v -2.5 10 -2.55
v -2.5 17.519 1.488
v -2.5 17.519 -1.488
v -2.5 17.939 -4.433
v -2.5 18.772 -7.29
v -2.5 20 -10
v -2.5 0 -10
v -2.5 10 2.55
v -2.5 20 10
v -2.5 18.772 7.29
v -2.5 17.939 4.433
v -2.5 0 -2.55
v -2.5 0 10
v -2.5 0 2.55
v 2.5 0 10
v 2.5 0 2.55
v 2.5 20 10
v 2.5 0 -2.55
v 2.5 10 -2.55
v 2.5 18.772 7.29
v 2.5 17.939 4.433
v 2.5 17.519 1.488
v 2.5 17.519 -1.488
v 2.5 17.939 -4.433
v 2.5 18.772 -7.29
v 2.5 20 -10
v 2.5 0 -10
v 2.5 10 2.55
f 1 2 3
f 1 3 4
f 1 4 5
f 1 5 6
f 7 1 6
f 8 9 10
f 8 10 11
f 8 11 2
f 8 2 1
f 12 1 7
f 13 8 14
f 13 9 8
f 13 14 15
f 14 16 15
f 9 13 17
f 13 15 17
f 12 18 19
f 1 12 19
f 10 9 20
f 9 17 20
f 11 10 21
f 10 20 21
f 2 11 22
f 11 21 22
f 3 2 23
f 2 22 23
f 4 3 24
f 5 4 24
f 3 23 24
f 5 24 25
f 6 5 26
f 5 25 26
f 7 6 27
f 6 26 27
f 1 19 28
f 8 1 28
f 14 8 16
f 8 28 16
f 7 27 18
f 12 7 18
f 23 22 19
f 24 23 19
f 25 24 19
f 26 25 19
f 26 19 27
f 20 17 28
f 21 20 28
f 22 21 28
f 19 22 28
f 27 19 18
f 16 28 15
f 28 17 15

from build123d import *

# Parameters (mm, degrees)
PAD_DEPTH = 2.5


with BuildPart() as part:
    # Sketch → Pad (new body, symmetric)
    with BuildSketch(Plane.YZ):
        with BuildLine():
            Line((10, -2.55), (10, 2.55))
            Line((10, 2.55), (0, 2.55))
            Line((0, 2.55), (0, 10))
            Line((0, 10), (20, 10))
            ThreePointArc((20, 10), (17.466185, 0), (20, -10))
            Line((20, -10), (0, -10))
            Line((0, -10), (0, -2.55))
            Line((0, -2.55), (10, -2.55))
        make_face()
    extrude(amount=PAD_DEPTH, both=True)


solid = part.part
